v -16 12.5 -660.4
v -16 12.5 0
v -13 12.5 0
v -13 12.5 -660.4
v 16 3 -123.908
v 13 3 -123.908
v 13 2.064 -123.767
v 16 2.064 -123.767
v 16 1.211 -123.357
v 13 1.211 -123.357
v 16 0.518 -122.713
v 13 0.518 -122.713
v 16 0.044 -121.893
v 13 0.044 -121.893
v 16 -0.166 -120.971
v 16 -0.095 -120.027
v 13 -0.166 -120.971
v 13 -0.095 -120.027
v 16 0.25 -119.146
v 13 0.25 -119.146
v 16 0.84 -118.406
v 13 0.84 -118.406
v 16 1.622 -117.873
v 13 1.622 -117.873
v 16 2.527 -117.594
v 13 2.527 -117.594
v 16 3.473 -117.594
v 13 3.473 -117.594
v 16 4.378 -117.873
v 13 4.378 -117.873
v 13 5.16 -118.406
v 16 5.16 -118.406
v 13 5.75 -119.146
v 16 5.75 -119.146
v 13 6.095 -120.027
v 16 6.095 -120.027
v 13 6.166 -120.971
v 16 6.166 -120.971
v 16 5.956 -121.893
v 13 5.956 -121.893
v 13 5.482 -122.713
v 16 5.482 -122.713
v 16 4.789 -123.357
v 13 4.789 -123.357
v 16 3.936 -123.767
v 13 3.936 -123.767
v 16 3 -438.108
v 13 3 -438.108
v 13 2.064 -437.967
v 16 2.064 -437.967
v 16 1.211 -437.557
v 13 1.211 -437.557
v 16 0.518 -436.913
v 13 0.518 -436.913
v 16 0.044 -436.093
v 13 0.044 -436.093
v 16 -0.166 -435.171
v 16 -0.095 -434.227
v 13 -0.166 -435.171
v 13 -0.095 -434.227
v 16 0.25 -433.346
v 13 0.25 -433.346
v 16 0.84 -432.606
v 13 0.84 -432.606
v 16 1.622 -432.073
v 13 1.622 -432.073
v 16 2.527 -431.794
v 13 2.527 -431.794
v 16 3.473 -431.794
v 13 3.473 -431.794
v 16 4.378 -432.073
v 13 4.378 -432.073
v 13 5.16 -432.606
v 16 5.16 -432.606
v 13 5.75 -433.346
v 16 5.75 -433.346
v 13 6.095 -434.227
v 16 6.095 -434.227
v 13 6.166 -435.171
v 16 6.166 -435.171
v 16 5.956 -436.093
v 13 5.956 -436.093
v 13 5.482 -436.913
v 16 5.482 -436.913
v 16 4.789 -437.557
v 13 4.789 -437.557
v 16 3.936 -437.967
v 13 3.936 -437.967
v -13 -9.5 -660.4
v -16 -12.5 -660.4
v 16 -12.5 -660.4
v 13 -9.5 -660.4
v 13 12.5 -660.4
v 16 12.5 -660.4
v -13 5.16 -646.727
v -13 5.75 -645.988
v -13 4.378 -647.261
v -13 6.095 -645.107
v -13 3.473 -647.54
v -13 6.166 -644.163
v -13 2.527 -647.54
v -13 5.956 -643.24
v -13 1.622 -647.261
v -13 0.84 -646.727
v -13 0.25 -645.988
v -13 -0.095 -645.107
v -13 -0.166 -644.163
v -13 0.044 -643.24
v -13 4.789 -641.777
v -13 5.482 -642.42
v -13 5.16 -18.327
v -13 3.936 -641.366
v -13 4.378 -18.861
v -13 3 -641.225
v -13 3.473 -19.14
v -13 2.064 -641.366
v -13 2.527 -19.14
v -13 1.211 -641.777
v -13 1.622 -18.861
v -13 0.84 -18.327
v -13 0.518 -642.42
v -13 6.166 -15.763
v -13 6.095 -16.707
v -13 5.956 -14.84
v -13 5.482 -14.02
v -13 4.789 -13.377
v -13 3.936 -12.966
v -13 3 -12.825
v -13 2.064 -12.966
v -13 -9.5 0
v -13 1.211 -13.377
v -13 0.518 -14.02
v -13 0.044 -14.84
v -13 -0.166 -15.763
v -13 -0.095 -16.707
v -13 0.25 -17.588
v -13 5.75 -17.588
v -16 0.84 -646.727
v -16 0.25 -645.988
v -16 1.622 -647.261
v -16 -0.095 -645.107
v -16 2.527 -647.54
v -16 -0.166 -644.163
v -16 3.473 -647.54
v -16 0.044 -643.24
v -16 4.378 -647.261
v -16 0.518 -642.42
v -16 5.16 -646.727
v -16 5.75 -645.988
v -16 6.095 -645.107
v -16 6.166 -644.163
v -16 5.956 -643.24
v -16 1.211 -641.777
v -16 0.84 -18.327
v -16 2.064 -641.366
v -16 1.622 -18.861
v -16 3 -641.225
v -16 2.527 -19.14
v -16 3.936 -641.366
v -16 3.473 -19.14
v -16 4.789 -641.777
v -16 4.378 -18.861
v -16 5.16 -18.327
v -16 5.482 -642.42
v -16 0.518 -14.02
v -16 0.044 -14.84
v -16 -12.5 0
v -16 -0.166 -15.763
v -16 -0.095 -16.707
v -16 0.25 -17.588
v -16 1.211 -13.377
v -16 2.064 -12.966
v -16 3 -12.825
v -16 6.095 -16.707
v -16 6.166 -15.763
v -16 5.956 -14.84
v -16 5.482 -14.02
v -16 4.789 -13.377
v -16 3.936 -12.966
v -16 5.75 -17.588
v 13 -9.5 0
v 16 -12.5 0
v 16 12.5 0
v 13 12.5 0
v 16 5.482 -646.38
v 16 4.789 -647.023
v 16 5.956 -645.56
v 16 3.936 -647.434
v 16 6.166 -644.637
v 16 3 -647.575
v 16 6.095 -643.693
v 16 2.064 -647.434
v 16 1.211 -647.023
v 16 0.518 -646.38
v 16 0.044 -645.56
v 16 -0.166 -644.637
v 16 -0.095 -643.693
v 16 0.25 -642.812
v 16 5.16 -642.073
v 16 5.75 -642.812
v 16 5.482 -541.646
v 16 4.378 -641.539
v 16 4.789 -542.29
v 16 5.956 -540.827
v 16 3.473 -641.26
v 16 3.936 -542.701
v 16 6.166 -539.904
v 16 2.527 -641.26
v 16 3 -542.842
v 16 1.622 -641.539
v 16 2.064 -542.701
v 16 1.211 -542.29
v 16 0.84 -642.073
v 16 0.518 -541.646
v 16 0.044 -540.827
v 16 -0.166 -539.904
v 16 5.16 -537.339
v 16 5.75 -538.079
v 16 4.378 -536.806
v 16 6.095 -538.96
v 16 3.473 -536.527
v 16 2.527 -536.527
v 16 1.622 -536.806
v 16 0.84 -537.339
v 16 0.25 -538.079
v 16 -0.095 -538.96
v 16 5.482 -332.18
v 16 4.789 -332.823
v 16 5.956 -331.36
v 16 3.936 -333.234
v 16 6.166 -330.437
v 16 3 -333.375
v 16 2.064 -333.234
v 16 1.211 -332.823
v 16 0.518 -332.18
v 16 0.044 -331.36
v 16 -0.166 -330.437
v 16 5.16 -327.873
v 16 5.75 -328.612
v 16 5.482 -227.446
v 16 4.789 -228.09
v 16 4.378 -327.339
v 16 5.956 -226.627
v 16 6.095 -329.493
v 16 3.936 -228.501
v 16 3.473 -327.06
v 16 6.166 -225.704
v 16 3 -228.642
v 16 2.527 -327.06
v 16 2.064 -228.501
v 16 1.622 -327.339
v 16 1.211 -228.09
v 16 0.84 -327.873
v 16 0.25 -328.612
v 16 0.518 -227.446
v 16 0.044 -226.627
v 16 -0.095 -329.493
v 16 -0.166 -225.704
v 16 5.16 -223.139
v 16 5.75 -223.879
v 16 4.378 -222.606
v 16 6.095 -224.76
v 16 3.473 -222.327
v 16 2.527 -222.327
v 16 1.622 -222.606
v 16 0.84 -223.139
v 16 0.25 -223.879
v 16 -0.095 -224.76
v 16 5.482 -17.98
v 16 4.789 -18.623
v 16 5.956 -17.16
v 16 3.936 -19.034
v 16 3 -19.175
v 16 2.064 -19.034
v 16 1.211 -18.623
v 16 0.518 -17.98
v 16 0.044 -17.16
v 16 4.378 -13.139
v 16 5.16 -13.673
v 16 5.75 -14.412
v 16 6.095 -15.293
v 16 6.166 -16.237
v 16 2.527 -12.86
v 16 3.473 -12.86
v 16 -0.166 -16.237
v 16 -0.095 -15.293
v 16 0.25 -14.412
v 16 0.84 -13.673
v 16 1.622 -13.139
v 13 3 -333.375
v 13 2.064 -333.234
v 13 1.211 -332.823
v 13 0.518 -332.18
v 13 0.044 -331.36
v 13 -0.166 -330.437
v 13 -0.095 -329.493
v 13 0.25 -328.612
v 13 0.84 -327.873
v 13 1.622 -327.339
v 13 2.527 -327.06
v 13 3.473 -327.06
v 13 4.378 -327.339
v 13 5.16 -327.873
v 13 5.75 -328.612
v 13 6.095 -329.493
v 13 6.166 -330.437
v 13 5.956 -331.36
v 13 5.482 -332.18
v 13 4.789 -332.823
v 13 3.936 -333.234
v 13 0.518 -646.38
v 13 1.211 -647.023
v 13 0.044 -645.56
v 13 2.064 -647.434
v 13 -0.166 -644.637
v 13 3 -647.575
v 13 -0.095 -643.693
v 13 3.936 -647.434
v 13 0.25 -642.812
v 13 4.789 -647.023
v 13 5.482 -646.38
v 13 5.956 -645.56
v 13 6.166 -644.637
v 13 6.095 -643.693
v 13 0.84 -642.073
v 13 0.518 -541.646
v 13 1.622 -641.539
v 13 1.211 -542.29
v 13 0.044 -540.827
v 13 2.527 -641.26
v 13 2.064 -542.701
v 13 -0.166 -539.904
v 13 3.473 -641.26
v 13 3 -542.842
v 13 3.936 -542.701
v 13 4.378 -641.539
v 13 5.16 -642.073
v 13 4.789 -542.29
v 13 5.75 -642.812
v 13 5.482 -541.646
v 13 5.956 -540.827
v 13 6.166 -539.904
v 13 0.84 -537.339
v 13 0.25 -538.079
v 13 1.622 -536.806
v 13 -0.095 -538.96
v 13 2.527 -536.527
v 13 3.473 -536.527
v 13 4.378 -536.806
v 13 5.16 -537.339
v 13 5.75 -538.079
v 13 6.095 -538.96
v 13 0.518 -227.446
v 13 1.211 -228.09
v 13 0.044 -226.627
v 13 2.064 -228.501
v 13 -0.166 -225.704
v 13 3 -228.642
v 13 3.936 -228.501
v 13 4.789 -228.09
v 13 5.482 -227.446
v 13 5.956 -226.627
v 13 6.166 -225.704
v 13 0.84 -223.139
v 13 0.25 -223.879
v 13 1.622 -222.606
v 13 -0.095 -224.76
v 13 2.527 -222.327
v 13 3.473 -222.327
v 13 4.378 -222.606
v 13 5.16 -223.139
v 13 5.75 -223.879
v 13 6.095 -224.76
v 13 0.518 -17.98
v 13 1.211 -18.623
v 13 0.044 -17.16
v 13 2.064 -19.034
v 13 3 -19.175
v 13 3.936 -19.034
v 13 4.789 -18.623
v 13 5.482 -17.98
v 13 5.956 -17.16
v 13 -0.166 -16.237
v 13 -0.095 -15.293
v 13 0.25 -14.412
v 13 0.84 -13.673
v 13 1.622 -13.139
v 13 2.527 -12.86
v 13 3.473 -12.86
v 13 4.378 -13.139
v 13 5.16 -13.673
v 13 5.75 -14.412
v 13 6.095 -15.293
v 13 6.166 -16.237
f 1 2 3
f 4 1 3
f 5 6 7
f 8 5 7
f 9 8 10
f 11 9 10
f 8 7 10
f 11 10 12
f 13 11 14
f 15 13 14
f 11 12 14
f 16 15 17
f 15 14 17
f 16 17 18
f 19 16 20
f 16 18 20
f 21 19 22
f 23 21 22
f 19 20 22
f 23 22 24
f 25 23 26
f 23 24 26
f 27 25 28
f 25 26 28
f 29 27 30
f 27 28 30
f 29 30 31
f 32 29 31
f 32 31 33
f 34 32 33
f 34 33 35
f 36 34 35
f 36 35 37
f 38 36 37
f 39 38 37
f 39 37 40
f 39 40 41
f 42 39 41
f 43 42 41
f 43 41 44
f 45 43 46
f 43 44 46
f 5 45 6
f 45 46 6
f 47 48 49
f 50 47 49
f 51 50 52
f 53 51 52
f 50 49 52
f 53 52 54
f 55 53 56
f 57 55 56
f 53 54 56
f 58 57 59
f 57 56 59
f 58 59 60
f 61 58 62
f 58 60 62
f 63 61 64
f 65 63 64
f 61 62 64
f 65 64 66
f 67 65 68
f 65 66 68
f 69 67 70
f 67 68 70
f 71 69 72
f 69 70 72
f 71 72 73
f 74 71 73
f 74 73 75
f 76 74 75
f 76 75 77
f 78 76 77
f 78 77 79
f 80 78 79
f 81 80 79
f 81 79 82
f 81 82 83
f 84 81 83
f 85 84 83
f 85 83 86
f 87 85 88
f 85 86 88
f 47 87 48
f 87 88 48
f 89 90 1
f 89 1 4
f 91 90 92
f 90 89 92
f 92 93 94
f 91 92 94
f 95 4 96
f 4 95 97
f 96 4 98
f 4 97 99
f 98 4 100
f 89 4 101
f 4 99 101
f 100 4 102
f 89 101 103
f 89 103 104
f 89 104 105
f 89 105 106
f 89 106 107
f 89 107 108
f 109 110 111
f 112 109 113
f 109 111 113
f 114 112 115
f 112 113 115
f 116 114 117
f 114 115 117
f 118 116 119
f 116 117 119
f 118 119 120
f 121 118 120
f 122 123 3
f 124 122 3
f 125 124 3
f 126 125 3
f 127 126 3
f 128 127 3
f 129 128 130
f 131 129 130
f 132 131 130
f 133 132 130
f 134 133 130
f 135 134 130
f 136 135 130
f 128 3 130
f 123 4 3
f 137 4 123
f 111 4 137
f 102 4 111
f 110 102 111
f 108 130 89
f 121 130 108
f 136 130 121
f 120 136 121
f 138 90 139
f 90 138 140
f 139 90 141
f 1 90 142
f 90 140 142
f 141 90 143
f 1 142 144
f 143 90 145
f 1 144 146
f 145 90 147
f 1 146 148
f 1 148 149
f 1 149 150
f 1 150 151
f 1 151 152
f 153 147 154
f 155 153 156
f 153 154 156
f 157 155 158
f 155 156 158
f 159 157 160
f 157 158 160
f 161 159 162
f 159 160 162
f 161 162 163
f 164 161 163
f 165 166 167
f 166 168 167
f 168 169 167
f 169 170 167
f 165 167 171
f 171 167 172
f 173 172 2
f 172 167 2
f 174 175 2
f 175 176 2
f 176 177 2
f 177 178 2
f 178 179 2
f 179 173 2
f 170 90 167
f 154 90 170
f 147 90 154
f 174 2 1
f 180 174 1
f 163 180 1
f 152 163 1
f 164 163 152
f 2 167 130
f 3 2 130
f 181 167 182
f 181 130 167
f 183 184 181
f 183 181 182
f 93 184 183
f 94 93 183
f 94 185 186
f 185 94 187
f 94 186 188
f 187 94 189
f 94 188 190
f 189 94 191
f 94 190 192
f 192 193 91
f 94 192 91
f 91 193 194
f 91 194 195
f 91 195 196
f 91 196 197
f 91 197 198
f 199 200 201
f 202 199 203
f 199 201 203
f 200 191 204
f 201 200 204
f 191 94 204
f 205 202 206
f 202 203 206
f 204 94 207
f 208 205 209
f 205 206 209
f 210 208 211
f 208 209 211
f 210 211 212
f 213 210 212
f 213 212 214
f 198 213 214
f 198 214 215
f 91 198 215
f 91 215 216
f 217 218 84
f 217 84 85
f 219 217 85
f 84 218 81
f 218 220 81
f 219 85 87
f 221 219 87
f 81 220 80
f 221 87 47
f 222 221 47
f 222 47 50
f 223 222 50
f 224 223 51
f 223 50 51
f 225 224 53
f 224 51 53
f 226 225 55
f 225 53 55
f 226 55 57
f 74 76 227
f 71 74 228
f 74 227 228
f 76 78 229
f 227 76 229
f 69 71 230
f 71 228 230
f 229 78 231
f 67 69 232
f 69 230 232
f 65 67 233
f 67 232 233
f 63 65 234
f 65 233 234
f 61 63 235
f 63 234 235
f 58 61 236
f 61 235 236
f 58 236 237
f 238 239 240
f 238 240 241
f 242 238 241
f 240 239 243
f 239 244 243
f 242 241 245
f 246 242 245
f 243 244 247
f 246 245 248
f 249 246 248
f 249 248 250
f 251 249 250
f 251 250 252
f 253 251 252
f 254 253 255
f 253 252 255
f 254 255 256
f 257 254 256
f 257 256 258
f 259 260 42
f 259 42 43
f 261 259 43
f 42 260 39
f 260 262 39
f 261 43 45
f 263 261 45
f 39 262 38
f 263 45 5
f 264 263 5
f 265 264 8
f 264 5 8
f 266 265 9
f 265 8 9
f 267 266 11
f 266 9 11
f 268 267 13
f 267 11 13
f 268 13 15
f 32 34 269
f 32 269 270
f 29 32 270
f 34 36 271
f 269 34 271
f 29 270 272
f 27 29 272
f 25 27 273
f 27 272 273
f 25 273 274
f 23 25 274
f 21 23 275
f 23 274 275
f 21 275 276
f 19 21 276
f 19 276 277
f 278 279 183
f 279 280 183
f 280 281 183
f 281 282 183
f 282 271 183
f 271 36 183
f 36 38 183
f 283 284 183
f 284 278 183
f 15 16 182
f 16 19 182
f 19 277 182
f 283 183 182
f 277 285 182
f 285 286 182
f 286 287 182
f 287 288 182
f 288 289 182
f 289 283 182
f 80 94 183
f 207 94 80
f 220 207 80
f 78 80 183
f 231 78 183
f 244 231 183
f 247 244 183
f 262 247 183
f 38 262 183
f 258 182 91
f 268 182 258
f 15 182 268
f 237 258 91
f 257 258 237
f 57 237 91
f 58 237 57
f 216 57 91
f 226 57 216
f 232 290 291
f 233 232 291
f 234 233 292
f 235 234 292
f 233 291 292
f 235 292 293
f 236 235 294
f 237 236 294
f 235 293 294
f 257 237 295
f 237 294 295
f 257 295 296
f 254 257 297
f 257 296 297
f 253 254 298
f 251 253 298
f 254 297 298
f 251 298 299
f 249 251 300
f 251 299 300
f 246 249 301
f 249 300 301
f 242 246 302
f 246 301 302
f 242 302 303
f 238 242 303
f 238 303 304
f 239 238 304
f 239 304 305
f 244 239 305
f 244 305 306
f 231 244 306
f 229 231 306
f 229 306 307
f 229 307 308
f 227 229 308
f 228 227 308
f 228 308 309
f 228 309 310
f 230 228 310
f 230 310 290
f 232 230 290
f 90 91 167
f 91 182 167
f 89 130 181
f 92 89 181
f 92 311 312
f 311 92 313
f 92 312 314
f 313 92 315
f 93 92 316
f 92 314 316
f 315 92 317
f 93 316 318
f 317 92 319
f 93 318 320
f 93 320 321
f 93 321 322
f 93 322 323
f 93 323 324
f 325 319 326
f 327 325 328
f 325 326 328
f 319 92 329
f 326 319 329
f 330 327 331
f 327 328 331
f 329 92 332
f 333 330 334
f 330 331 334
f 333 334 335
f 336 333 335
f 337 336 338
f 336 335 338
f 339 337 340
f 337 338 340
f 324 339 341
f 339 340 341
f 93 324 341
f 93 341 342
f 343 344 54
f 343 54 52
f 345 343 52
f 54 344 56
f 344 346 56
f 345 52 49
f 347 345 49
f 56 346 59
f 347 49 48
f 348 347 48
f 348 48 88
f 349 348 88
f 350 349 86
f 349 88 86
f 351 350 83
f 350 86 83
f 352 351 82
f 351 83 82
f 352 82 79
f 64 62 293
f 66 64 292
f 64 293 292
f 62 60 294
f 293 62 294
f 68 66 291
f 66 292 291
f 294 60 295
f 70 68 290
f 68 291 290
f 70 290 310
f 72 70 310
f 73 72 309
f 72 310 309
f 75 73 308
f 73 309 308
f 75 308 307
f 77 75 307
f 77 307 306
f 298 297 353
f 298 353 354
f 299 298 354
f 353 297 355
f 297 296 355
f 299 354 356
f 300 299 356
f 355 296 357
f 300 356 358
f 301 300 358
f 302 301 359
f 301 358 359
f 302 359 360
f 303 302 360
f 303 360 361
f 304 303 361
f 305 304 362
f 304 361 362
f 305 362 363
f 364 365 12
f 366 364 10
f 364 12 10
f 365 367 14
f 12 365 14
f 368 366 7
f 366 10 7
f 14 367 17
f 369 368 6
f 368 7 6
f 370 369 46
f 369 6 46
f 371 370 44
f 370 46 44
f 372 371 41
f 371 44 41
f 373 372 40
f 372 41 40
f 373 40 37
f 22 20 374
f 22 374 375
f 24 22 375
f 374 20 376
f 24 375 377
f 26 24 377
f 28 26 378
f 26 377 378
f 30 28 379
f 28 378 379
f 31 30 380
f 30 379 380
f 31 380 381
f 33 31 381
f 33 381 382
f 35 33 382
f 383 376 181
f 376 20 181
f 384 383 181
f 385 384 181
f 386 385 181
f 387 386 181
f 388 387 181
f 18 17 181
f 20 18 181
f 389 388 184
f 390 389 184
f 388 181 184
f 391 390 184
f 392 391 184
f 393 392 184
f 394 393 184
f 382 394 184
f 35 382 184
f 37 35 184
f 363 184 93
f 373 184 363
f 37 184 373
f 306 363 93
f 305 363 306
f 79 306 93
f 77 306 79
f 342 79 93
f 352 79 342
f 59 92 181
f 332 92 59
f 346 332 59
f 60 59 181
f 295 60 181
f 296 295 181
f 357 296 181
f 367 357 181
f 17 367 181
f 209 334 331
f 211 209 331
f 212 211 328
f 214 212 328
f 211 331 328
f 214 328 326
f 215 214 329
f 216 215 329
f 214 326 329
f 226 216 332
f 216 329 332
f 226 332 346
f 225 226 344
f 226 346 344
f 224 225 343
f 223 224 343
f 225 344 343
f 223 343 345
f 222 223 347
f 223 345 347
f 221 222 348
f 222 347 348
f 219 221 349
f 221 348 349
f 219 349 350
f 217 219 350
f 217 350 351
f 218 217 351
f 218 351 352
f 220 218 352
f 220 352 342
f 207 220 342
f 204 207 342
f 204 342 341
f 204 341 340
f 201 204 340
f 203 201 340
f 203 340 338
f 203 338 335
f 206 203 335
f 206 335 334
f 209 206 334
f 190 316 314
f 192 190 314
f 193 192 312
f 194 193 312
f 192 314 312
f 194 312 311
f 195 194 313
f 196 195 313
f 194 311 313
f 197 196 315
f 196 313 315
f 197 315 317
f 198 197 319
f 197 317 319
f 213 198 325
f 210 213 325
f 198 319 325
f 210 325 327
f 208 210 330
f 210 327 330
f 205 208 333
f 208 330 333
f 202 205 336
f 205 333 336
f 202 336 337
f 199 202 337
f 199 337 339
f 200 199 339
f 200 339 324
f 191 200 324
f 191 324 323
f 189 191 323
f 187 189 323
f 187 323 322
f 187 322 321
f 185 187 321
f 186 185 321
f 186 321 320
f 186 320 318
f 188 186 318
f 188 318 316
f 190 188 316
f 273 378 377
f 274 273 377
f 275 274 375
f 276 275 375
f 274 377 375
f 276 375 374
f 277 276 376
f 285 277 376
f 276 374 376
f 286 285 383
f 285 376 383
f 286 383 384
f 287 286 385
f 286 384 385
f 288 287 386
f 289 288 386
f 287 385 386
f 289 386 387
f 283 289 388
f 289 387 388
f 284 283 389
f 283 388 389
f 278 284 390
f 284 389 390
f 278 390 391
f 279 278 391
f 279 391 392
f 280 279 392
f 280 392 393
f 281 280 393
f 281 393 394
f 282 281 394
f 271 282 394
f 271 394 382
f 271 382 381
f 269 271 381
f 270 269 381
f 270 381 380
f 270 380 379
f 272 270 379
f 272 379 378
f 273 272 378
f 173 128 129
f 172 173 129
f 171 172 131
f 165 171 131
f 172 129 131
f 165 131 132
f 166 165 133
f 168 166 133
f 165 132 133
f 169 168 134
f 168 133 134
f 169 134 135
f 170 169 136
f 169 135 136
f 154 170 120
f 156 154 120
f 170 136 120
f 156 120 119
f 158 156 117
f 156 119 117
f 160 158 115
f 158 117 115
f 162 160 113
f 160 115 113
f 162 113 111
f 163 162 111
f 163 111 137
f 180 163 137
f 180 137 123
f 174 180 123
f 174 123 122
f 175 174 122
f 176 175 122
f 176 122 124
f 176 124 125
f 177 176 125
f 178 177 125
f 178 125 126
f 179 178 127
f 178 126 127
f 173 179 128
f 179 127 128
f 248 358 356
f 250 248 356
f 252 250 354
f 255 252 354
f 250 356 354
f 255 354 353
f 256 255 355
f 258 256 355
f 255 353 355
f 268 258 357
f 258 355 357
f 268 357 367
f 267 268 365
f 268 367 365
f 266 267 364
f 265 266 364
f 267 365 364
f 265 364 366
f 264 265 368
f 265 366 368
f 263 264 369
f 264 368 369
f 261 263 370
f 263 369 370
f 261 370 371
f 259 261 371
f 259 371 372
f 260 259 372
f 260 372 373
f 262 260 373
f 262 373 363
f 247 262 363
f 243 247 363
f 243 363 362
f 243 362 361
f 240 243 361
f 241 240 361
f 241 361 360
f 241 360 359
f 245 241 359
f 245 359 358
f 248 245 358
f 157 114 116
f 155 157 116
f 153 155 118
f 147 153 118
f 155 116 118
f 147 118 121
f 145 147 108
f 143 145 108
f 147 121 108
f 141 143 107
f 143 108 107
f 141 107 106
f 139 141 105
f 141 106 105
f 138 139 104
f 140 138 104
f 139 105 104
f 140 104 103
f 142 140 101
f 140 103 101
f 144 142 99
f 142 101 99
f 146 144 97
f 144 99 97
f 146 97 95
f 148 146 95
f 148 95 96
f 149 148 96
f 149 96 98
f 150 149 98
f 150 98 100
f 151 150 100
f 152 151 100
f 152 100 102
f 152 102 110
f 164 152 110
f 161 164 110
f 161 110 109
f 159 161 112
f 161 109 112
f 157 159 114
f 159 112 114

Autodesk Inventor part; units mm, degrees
ref_plane "YZ Plane" through (0, 0, 0) normal (1, 0, 0) x (0, 1, 0)
ref_plane "XZ Plane" through (0, 0, 0) normal (0, 1, 0) x (-1, 0, 0)
ref_plane "XY Plane" through (0, 0, 0) normal (0, 0, 1) x (1, 0, 0)
sketch "Sketch1" plane through (0, 0, 0) normal (0, 0, 1) x (1, 0, 0)
  line L0 (-16, 12.5) -> (-13, 12.5)
  line L1 (-13, 12.5) -> (-13, -9.5)
  line L2 (-13, -9.5) -> (13, -9.5)
  line L3 (13, -9.5) -> (13, 12.5)
  line L4 (13, 12.5) -> (16, 12.5)
  line L5 (16, 12.5) -> (16, -12.5)
  line L6 (16, -12.5) -> (-16, -12.5)
  line L7 (-16, -12.5) -> (-16, 12.5)
  point P0 (0, 0)
  dimension "d0" = 3
  dimension "d2" = 3
  dimension "d3" = 25
  dimension "d4" = 32
  dimension "d5" = 16
  dimension "d7" = 12.5
  dimension "d8" = 3
  dimension "d95" = 25
extrude "Extrusion1" add sketch "Sketch1" against normal blind 660.4
sketch "Sketch5" plane through (16, -12.5, 0) normal (1, 0, 0) x (0, 0, -1)
  circle A0 centre (16, 15.5) radius 3.175
  circle A1 centre (120.7333, 15.5) radius 3.175
  circle A2 centre (225.4667, 15.5) radius 3.175
  circle A3 centre (330.2, 15.5) radius 3.175
  circle A4 centre (434.9333, 15.5) radius 3.175
  circle A5 centre (539.6667, 15.5) radius 3.175
  circle A6 centre (644.4, 15.5) radius 3.175
  line L0 (0, 25) -> (0, 0) projected
  line L1 (660.4, 25) -> (660.4, 0) projected
  line L2 (0, 3) -> (660.4, 3) projected
  point P0 (0, 12.5)
  dimension "d56" = 6.35
  dimension "d58" = 6.35
  dimension "d59" = 6.35
  dimension "d61" = 6.35
  dimension "d63" = 6.35
  dimension "d64" = 6.35
  dimension "d65" = 6.35
  dimension "d68" = 16
  dimension "d78" = 660.4
  dimension "d79" = 16
  dimension "d80" = 628.4
  dimension "d81" = 104.7333
  dimension "d82" = 104.7333
  dimension "d83" = 104.7333
  dimension "d84" = 104.7333
  dimension "d85" = 104.7333
  dimension "d86" = 104.7333
  dimension "d94" = 12.5
hole "Hole1" at (16, 3, -644.4) at (16, 3, -539.6667) at (16, 3, -434.9333) at (16, 3, -330.2) at (16, 3, -225.4667) at (16, 3, -120.7333) at (16, 3, -16) direction (-1, 0, 0) diameter 6.35 depth 3 tip angle 118
sketch "Sketch6" plane through (-16, -12.5, 0) normal (-1, 0, 0) x (0, 0, 1)
  circle A0 centre (-16, 15.5) radius 3.175 projected
  circle A1 centre (-644.4, 15.5) radius 3.175 projected
  circle A2 centre (-644.4, 15.5) radius 3.175
  circle A3 centre (-16, 15.5) radius 3.175
  point P0 (0, 12.5)
hole "Hole2" at (-16, 3, -644.4) at (-16, 3, -16) direction (1, 0, 0) diameter 6.35 depth 3 tip angle 118
equation "\"d2\" = d0"
equation "\"d5\" = 0.5 * d4"
equation "\"d7\" = 0.5 * d3"
equation "\"d8\" = d0"
equation "\"d95\" = d3"
equation "\"d58\" = d56"
equation "\"d59\" = d58"
equation "\"d61\" = d60"
equation "\"d63\" = d62"
equation "\"d64\" = d63"
equation "\"d65\" = d64"
equation "\"d81\" = 0.166667 * d80"
equation "\"d82\" = d81"
equation "\"d83\" = d82"
equation "\"d84\" = d83"
equation "\"d85\" = d84"
equation "\"d60\" = d59"
equation "\"d62\" = d61"
properties part number "26in C-Channel Left" material "Aluminum 6061"
